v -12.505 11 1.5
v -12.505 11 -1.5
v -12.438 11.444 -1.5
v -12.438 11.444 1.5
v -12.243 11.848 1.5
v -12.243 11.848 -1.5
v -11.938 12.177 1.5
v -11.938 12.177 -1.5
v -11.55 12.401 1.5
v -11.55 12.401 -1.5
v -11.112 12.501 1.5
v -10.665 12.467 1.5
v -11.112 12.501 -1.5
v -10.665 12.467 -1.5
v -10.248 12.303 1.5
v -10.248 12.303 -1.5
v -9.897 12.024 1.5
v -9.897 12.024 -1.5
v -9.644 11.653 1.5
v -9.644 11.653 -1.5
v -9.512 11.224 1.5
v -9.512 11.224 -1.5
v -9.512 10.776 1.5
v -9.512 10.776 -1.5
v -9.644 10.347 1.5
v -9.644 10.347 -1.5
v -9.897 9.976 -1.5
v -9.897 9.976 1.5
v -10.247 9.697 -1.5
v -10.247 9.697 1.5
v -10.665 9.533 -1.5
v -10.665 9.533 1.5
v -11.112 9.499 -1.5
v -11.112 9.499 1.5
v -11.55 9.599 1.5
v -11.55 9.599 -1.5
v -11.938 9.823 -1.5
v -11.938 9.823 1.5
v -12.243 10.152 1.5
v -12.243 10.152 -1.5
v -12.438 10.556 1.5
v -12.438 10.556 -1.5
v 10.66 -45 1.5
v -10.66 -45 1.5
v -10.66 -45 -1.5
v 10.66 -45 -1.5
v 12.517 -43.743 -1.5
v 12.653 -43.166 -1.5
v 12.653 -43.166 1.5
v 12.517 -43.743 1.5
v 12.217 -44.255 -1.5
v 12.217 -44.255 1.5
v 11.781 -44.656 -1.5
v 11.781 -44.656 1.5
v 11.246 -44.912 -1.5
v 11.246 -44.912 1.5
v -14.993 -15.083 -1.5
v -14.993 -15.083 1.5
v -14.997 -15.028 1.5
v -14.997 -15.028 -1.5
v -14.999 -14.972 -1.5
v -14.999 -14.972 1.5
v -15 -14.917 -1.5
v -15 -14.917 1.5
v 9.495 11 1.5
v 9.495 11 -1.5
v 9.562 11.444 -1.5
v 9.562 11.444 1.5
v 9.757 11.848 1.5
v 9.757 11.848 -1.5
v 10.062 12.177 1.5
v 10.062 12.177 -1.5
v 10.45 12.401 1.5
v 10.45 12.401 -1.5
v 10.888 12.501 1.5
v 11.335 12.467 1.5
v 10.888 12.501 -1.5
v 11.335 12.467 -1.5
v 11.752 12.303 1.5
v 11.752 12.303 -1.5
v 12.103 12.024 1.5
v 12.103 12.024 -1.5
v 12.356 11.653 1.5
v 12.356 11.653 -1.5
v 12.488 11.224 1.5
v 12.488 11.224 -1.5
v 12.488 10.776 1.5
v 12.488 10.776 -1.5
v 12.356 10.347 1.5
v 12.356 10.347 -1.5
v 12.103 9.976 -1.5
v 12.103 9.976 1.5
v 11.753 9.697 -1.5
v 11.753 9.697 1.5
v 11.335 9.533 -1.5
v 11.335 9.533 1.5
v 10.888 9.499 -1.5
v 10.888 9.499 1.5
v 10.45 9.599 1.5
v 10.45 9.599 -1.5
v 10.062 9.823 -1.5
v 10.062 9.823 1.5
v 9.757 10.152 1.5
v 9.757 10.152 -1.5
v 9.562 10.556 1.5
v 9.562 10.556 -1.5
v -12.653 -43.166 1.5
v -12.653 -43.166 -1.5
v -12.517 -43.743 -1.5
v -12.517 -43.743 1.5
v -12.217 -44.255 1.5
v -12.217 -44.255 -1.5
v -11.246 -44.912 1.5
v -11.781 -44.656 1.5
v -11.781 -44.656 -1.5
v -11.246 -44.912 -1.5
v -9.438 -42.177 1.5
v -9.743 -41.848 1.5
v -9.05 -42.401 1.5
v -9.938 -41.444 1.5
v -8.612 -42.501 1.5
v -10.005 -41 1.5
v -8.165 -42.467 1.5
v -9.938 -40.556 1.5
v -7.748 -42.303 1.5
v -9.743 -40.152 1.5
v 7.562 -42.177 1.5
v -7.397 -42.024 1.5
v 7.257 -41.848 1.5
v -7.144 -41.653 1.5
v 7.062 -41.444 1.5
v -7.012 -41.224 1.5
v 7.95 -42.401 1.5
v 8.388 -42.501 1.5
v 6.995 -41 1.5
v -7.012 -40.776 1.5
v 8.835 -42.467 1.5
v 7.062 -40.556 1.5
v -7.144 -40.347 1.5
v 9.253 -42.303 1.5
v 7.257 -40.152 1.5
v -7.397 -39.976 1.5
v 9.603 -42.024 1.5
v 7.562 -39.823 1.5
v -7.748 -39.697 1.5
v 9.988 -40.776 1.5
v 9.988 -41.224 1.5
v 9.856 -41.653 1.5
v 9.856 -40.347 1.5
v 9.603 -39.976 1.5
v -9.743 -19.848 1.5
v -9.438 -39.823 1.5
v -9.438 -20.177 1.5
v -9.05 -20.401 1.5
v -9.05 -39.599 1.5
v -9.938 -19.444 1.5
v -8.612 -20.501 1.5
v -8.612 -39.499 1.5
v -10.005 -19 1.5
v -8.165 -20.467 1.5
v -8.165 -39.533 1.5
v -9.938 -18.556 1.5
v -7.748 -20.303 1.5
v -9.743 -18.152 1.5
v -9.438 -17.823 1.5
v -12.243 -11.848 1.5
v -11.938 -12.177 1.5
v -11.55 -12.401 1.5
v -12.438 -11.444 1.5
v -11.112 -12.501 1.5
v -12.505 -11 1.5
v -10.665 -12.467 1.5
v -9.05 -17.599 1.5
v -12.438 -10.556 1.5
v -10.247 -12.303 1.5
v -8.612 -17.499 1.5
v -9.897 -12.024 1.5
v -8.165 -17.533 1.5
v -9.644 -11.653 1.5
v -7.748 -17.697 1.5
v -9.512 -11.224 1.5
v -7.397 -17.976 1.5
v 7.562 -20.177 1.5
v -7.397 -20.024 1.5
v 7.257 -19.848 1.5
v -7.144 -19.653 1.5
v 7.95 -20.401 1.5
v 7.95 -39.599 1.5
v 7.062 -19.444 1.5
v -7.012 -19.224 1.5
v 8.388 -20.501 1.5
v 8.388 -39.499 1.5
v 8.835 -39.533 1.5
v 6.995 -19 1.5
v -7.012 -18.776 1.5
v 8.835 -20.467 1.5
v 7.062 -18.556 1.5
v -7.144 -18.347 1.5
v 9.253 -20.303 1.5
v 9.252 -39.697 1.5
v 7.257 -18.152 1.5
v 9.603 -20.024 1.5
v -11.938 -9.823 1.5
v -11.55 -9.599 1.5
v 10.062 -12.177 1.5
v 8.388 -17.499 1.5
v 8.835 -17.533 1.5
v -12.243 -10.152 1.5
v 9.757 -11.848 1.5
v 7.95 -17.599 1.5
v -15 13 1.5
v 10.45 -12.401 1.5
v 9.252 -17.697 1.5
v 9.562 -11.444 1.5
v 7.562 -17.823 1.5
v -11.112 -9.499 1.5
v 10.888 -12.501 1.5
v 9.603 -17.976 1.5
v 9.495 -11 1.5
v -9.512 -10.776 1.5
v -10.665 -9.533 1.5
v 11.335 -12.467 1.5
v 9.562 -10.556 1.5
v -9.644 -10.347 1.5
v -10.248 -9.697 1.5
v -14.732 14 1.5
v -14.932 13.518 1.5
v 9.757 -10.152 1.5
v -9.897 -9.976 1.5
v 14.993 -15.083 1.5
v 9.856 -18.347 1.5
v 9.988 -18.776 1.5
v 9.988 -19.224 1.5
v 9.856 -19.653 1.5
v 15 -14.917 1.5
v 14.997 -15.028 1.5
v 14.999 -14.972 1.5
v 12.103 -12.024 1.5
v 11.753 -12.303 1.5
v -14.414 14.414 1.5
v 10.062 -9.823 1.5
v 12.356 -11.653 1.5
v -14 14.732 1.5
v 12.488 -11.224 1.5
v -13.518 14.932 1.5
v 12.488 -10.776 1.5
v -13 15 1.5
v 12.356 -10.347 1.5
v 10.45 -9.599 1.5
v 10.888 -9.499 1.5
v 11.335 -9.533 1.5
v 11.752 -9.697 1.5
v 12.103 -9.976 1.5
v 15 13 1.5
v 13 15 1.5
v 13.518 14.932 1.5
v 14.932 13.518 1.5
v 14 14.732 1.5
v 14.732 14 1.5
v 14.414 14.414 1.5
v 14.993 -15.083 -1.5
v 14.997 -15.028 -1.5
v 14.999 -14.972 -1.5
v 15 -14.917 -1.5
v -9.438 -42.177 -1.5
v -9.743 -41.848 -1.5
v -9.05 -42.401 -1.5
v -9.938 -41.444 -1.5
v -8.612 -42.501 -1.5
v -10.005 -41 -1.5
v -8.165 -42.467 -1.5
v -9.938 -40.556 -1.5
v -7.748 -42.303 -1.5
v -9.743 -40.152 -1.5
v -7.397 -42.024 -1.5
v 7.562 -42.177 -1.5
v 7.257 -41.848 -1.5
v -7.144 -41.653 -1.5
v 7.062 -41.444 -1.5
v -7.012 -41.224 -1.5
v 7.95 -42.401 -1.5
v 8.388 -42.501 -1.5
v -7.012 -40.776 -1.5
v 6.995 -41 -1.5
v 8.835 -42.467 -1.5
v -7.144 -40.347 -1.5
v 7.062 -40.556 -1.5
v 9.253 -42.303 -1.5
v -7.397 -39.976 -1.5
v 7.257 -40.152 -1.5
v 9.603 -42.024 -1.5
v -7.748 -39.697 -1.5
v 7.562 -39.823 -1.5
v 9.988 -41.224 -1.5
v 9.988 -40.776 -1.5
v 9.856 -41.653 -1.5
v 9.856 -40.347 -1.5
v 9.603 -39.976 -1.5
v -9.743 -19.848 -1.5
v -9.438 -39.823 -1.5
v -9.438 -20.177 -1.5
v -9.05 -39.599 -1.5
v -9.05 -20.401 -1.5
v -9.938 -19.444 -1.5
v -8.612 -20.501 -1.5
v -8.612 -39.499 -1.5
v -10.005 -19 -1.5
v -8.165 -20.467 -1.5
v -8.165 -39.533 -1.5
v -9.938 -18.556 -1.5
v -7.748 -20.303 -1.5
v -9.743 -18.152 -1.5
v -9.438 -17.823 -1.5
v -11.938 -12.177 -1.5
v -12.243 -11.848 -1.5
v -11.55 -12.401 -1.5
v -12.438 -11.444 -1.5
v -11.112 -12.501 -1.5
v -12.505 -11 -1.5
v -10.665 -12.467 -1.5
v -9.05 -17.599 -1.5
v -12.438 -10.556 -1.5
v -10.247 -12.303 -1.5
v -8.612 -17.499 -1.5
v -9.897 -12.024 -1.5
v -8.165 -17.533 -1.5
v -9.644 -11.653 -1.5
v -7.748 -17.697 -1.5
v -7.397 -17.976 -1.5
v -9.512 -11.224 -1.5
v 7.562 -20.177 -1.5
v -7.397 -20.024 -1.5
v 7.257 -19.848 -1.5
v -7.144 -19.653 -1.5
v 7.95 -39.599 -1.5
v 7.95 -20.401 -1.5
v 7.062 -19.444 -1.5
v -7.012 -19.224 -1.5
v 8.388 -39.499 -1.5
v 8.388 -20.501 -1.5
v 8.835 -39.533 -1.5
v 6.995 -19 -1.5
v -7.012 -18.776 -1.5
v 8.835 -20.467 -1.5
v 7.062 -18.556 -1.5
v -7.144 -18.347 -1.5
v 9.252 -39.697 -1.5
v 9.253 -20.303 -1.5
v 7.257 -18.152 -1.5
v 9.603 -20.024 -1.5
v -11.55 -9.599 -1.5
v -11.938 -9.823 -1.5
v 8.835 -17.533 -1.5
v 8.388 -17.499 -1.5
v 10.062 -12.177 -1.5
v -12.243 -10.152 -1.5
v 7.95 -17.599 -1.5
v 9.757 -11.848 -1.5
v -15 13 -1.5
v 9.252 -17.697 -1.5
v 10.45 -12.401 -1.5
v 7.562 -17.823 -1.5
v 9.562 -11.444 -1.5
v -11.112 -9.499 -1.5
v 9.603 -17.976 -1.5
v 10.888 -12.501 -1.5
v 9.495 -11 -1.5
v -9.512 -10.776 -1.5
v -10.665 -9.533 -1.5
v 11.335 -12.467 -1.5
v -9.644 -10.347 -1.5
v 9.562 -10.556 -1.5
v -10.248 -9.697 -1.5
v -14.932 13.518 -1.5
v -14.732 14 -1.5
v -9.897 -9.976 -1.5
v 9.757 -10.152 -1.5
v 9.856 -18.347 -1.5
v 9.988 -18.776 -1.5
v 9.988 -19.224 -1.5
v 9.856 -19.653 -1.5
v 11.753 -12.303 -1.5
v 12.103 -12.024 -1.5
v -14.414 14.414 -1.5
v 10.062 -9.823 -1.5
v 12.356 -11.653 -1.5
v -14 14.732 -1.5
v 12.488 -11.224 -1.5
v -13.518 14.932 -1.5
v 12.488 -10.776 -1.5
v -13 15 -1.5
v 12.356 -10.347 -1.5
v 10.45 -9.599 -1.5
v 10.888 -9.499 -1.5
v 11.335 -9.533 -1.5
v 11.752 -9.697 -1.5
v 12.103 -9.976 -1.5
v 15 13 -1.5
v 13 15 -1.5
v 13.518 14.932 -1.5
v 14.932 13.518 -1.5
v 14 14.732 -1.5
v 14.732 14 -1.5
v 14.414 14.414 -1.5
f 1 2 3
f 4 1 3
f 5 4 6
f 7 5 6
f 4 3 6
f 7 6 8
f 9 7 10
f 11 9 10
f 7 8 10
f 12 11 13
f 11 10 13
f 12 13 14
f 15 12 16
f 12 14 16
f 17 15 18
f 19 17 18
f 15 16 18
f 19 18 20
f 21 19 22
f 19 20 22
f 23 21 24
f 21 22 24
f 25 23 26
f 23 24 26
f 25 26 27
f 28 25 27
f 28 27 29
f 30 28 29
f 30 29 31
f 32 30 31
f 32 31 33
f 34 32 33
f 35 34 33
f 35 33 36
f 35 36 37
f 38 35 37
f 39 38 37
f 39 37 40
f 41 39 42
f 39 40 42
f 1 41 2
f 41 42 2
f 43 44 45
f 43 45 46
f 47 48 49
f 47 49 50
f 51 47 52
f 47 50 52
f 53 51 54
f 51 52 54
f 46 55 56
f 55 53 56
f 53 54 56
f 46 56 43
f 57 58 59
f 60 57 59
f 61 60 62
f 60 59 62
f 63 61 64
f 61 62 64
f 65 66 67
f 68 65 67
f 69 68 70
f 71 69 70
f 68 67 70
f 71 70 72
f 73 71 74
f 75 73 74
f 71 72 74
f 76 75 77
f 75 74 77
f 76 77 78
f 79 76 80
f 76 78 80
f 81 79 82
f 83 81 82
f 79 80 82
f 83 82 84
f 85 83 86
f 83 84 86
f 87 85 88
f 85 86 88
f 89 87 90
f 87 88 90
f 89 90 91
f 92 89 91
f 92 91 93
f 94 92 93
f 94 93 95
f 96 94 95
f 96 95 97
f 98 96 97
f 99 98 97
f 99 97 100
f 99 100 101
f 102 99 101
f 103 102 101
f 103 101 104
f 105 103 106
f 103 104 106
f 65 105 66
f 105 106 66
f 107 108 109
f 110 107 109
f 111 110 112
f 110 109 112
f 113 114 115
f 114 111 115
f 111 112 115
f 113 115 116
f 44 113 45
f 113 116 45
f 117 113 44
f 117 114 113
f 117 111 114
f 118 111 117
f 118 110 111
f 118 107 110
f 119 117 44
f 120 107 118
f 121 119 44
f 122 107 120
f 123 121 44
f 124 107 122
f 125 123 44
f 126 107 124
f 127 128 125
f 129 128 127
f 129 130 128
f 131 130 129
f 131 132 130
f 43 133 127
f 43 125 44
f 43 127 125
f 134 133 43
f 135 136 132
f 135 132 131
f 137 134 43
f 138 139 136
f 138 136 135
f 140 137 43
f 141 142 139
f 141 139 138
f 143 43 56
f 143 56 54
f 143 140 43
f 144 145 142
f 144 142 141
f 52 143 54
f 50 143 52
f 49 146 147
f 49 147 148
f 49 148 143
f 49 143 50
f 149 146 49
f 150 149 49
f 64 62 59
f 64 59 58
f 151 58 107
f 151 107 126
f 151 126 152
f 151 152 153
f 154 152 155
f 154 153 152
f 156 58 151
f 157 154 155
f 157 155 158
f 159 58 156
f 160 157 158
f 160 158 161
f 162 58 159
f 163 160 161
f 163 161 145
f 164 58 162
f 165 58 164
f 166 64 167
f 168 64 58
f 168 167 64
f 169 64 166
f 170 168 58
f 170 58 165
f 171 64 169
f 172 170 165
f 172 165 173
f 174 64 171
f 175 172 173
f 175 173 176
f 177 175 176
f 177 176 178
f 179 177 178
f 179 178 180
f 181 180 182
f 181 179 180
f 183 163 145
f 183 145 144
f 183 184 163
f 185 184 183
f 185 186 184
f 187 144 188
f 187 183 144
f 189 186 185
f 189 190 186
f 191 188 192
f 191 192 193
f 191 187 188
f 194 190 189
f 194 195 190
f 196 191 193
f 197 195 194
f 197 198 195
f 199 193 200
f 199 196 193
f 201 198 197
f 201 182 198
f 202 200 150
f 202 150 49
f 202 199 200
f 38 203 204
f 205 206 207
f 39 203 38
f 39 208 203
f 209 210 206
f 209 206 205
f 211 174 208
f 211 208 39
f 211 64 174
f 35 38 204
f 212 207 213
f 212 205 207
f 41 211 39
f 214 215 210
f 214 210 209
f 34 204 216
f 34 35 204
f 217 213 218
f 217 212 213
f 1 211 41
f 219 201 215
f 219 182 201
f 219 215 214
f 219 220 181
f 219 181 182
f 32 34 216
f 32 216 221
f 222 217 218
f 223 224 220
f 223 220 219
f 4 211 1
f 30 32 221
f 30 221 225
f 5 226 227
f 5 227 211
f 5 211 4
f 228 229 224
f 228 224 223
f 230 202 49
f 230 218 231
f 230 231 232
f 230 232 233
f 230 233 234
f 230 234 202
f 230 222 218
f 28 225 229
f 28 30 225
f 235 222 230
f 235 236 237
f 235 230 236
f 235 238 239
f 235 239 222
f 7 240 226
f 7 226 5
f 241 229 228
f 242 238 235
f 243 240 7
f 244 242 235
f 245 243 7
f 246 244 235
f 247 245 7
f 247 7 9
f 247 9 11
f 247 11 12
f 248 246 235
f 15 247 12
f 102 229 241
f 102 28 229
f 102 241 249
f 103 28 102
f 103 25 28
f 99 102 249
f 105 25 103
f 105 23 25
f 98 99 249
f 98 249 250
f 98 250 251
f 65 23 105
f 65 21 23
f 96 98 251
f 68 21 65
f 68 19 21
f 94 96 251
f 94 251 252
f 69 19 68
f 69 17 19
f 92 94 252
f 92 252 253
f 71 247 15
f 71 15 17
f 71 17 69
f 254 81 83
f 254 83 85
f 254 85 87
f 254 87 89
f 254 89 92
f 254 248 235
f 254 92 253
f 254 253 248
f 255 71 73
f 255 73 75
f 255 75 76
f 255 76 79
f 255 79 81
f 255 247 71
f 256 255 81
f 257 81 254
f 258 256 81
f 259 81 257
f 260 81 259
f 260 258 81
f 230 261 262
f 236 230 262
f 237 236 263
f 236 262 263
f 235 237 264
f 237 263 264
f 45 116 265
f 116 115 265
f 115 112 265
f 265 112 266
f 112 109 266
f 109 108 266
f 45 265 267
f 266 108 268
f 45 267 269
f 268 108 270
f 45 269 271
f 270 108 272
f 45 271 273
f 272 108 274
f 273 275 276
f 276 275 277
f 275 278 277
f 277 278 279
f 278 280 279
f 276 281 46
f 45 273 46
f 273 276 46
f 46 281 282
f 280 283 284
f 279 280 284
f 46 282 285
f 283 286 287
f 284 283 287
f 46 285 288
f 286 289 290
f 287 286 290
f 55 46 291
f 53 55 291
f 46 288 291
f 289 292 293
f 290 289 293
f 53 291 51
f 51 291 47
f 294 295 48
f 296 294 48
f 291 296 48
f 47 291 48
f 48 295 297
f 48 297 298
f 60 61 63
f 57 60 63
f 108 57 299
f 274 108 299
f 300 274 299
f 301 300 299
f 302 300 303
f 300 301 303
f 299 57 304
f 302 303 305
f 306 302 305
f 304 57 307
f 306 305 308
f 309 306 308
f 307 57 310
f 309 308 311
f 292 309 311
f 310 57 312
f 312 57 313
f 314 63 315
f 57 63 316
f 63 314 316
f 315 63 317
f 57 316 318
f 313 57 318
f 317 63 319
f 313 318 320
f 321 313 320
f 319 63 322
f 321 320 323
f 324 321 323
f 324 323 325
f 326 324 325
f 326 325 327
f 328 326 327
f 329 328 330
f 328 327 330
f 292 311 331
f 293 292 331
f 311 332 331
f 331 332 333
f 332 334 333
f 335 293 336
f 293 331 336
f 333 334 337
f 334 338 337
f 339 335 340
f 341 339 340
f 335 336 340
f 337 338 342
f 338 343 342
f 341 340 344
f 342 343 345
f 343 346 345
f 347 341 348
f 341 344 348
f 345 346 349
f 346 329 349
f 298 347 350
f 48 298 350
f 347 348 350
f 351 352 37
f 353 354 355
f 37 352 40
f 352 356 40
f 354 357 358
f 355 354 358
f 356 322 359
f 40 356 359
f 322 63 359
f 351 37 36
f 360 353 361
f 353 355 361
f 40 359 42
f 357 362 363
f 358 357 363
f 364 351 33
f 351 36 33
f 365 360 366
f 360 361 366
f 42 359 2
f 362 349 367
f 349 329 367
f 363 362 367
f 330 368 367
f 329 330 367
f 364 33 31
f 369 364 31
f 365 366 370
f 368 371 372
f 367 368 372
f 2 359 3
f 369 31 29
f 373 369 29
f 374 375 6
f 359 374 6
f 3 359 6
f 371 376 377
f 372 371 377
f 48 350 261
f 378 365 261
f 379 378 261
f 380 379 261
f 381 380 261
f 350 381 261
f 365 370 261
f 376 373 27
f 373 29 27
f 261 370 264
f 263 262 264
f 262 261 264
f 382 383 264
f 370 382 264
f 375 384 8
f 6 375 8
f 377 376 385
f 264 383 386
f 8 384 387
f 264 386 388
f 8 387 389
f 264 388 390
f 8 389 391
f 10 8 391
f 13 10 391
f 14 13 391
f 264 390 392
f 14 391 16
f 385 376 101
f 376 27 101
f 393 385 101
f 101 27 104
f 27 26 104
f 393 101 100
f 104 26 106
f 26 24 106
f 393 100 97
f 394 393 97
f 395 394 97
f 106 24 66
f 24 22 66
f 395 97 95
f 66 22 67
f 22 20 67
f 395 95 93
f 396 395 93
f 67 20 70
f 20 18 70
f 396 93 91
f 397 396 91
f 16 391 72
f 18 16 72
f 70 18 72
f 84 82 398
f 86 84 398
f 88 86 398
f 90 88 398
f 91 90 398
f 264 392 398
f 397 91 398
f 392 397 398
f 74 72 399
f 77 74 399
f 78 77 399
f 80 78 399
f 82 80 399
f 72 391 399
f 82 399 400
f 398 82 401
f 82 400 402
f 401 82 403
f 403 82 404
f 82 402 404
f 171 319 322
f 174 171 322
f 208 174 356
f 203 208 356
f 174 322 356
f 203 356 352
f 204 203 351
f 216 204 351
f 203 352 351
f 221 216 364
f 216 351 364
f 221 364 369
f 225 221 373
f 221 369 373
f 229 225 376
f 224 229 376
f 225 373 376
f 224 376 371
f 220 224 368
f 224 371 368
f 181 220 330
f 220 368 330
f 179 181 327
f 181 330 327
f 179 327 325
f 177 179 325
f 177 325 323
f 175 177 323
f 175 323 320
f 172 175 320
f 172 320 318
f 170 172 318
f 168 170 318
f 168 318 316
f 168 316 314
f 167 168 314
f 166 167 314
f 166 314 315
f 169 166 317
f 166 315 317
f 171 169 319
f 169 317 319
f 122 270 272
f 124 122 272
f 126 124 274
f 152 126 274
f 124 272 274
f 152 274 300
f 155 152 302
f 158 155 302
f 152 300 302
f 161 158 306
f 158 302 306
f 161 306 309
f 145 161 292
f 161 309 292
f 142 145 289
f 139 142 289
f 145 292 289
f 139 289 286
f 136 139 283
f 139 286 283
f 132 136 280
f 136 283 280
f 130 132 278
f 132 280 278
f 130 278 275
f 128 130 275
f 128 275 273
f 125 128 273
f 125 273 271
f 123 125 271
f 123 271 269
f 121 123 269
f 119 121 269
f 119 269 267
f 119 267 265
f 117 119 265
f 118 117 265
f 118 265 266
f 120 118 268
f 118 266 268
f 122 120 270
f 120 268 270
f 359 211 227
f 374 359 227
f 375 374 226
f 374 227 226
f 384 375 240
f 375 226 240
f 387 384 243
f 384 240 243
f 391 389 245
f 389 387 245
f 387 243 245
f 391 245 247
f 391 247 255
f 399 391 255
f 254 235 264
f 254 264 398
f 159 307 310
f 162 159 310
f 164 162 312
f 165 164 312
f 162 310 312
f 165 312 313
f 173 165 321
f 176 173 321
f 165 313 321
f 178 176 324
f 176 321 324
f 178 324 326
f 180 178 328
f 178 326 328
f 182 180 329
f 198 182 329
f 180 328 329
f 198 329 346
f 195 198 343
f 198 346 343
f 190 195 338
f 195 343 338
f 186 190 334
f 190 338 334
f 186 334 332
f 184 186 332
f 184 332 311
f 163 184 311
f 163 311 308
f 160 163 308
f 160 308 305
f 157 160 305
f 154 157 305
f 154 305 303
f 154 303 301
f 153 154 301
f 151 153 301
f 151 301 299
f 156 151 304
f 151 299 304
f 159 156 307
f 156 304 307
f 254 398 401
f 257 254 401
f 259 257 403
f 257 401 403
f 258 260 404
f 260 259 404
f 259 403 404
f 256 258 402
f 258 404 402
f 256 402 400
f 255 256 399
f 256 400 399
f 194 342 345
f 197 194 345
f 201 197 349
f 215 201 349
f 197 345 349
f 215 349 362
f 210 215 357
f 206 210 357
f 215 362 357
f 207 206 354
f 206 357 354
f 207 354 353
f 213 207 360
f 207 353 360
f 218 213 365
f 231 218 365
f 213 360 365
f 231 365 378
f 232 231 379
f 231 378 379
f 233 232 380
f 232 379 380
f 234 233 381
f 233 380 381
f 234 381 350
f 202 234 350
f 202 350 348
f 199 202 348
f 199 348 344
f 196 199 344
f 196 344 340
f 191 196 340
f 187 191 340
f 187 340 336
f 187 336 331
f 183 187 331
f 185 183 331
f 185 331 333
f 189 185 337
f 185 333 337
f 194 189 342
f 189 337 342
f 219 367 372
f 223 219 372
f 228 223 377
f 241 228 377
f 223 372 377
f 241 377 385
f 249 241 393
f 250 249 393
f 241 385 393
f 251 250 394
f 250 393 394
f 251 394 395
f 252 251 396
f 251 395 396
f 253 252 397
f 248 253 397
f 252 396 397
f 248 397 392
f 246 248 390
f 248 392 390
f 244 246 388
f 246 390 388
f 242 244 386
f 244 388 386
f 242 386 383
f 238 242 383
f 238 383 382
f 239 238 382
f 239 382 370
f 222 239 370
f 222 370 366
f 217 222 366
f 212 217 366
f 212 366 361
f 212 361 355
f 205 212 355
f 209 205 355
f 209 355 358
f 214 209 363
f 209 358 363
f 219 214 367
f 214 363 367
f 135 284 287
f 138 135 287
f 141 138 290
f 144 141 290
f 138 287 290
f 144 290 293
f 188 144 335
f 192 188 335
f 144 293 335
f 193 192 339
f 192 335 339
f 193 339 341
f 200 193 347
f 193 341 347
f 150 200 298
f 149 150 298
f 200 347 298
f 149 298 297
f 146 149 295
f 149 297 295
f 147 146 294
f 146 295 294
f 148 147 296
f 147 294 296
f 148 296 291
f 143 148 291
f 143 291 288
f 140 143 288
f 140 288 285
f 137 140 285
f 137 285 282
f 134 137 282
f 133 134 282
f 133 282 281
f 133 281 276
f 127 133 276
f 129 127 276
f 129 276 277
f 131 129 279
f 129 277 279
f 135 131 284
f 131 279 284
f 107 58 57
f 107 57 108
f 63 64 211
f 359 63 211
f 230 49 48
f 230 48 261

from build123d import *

# Parameters (mm, degrees)
SKETCH_1_W          = 30
SKETCH_1_H          = 30
SKETCH_1_W_2        = 25
EXTRUDE_1_DEPTH     = 1.5
EXTRUDE_2_DEPTH     = 3
SKETCH_5_R          = 1.505
CUT_EXTRUDE_2_DEPTH = 3
SKETCH_3_R          = 1.505
CUT_EXTRUDE_1_DEPTH = 3
FILLET_1_R          = 2


with BuildPart() as part:
    # 草图1 → 凸台-拉伸1 (new, symmetric)
    with BuildSketch(Plane.XY):
        Rectangle(SKETCH_1_W, SKETCH_1_H)
        with Locations((0, -30)):
            Rectangle(SKETCH_1_W_2, SKETCH_1_H)
    extrude(amount=EXTRUDE_1_DEPTH, both=True)

    # 草图2 → 凸台-拉伸2 (add)
    with BuildSketch(Plane.XY.offset(1.5)):
        Polygon((-15, -15), (-12.5, -45), (12.5, -45), (15, -15), align=None)
    extrude(amount=-EXTRUDE_2_DEPTH)

    # 草图5 → 切除-拉伸2 (cut)
    with BuildSketch(Plane(origin=(0, 0, -1.5), x_dir=(-1, 0, 0), z_dir=(0, 0, -1))):
        with Locations((-8.5, -19)):
            Circle(SKETCH_5_R)
        with Locations((8.5, -19)):
            Circle(SKETCH_5_R)
        with Locations((-8.5, -41)):
            Circle(SKETCH_5_R)
        with Locations((8.5, -41)):
            Circle(SKETCH_5_R)
    extrude(amount=-CUT_EXTRUDE_2_DEPTH, mode=Mode.SUBTRACT)

    # 草图3 → 切除-拉伸1 (cut)
    with BuildSketch(Plane(origin=(0, 0, -1.5), x_dir=(-1, 0, 0), z_dir=(0, 0, -1))):
        with Locations((-11, 11)):
            Circle(SKETCH_3_R)
        with Locations((11, 11)):
            Circle(SKETCH_3_R)
        with Locations((-11, -11)):
            Circle(SKETCH_3_R)
        with Locations((11, -11)):
            Circle(SKETCH_3_R)
    extrude(amount=-CUT_EXTRUDE_1_DEPTH, mode=Mode.SUBTRACT)

    # 圆角1
    # the kernel refuses this fillet: 2 mm, written as the material it takes off along each edge
    with BuildSketch(Plane(origin=(-15, -15, 1.707972894), x_dir=(0, 1, 0), z_dir=(0, 0, -1)), Plane(origin=(15, -15, -1.707972894), x_dir=(0, 1, 0), z_dir=(0, 0, 1))) as fillet_1_piece_1:
        with BuildLine():
            CenterArc((FILLET_1_R * 0.0415945787923, FILLET_1_R), FILLET_1_R, 265.236358309, 4.763641691)
            Line((-FILLET_1_R * 0.0414509010614, FILLET_1_R * 0.00345424175512), (0, 0))
            Line((0, 0), (FILLET_1_R * 0.0415945787923, 0))
        make_face()
    extrude(amount=3.415945788, mode=Mode.SUBTRACT)
    with BuildSketch(Plane(origin=(-15, 15, 6.5), x_dir=(0, -1, 0), z_dir=(0, 0, -1))) as fillet_1_piece_2:
        with BuildLine():
            CenterArc((FILLET_1_R, -FILLET_1_R), FILLET_1_R, 90, 90)
            Line((0, -FILLET_1_R), (0, 0))
            Line((0, 0), (FILLET_1_R, 0))
        make_face()
    extrude(amount=13, mode=Mode.SUBTRACT)
    with BuildSketch(Plane(origin=(15, 15, -6.5), x_dir=(-1, 0, 0), z_dir=(0, 0, 1))) as fillet_1_piece_3:
        with BuildLine():
            CenterArc((FILLET_1_R, FILLET_1_R), FILLET_1_R, 180, 90)
            Line((0, FILLET_1_R), (0, 0))
            Line((0, 0), (FILLET_1_R, 0))
        make_face()
    extrude(amount=13, mode=Mode.SUBTRACT)
    with BuildSketch(Plane(origin=(12.5, -45, 6.100664408), x_dir=(-1, 0, 0), z_dir=(0, 0, -1))) as fillet_1_piece_4:
        with BuildLine():
            CenterArc((FILLET_1_R * 0.920132881566, FILLET_1_R), FILLET_1_R, 184.763641691, 85.236358309)
            Line((-FILLET_1_R * 0.0764128766789, FILLET_1_R * 0.916954520146), (0, 0))
            Line((0, 0), (FILLET_1_R * 0.920132881566, 0))
        make_face()
    extrude(amount=12.201328816, mode=Mode.SUBTRACT)
    with BuildSketch(Plane(origin=(-12.5, -45, -6.100664408), x_dir=(-0.08304547985374029, 0.9965457582448797, 0), z_dir=(0, 0, 1))) as fillet_1_piece_5:
        with BuildLine():
            CenterArc((FILLET_1_R * 0.920132881566, -FILLET_1_R), FILLET_1_R, 90, 85.236358309)
            Line((-FILLET_1_R * 0.0764128766789, -FILLET_1_R * 0.916954520146), (0, 0))
            Line((0, 0), (FILLET_1_R * 0.920132881566, 0))
        make_face()
    extrude(amount=12.201328816, mode=Mode.SUBTRACT)


solid = part.part
